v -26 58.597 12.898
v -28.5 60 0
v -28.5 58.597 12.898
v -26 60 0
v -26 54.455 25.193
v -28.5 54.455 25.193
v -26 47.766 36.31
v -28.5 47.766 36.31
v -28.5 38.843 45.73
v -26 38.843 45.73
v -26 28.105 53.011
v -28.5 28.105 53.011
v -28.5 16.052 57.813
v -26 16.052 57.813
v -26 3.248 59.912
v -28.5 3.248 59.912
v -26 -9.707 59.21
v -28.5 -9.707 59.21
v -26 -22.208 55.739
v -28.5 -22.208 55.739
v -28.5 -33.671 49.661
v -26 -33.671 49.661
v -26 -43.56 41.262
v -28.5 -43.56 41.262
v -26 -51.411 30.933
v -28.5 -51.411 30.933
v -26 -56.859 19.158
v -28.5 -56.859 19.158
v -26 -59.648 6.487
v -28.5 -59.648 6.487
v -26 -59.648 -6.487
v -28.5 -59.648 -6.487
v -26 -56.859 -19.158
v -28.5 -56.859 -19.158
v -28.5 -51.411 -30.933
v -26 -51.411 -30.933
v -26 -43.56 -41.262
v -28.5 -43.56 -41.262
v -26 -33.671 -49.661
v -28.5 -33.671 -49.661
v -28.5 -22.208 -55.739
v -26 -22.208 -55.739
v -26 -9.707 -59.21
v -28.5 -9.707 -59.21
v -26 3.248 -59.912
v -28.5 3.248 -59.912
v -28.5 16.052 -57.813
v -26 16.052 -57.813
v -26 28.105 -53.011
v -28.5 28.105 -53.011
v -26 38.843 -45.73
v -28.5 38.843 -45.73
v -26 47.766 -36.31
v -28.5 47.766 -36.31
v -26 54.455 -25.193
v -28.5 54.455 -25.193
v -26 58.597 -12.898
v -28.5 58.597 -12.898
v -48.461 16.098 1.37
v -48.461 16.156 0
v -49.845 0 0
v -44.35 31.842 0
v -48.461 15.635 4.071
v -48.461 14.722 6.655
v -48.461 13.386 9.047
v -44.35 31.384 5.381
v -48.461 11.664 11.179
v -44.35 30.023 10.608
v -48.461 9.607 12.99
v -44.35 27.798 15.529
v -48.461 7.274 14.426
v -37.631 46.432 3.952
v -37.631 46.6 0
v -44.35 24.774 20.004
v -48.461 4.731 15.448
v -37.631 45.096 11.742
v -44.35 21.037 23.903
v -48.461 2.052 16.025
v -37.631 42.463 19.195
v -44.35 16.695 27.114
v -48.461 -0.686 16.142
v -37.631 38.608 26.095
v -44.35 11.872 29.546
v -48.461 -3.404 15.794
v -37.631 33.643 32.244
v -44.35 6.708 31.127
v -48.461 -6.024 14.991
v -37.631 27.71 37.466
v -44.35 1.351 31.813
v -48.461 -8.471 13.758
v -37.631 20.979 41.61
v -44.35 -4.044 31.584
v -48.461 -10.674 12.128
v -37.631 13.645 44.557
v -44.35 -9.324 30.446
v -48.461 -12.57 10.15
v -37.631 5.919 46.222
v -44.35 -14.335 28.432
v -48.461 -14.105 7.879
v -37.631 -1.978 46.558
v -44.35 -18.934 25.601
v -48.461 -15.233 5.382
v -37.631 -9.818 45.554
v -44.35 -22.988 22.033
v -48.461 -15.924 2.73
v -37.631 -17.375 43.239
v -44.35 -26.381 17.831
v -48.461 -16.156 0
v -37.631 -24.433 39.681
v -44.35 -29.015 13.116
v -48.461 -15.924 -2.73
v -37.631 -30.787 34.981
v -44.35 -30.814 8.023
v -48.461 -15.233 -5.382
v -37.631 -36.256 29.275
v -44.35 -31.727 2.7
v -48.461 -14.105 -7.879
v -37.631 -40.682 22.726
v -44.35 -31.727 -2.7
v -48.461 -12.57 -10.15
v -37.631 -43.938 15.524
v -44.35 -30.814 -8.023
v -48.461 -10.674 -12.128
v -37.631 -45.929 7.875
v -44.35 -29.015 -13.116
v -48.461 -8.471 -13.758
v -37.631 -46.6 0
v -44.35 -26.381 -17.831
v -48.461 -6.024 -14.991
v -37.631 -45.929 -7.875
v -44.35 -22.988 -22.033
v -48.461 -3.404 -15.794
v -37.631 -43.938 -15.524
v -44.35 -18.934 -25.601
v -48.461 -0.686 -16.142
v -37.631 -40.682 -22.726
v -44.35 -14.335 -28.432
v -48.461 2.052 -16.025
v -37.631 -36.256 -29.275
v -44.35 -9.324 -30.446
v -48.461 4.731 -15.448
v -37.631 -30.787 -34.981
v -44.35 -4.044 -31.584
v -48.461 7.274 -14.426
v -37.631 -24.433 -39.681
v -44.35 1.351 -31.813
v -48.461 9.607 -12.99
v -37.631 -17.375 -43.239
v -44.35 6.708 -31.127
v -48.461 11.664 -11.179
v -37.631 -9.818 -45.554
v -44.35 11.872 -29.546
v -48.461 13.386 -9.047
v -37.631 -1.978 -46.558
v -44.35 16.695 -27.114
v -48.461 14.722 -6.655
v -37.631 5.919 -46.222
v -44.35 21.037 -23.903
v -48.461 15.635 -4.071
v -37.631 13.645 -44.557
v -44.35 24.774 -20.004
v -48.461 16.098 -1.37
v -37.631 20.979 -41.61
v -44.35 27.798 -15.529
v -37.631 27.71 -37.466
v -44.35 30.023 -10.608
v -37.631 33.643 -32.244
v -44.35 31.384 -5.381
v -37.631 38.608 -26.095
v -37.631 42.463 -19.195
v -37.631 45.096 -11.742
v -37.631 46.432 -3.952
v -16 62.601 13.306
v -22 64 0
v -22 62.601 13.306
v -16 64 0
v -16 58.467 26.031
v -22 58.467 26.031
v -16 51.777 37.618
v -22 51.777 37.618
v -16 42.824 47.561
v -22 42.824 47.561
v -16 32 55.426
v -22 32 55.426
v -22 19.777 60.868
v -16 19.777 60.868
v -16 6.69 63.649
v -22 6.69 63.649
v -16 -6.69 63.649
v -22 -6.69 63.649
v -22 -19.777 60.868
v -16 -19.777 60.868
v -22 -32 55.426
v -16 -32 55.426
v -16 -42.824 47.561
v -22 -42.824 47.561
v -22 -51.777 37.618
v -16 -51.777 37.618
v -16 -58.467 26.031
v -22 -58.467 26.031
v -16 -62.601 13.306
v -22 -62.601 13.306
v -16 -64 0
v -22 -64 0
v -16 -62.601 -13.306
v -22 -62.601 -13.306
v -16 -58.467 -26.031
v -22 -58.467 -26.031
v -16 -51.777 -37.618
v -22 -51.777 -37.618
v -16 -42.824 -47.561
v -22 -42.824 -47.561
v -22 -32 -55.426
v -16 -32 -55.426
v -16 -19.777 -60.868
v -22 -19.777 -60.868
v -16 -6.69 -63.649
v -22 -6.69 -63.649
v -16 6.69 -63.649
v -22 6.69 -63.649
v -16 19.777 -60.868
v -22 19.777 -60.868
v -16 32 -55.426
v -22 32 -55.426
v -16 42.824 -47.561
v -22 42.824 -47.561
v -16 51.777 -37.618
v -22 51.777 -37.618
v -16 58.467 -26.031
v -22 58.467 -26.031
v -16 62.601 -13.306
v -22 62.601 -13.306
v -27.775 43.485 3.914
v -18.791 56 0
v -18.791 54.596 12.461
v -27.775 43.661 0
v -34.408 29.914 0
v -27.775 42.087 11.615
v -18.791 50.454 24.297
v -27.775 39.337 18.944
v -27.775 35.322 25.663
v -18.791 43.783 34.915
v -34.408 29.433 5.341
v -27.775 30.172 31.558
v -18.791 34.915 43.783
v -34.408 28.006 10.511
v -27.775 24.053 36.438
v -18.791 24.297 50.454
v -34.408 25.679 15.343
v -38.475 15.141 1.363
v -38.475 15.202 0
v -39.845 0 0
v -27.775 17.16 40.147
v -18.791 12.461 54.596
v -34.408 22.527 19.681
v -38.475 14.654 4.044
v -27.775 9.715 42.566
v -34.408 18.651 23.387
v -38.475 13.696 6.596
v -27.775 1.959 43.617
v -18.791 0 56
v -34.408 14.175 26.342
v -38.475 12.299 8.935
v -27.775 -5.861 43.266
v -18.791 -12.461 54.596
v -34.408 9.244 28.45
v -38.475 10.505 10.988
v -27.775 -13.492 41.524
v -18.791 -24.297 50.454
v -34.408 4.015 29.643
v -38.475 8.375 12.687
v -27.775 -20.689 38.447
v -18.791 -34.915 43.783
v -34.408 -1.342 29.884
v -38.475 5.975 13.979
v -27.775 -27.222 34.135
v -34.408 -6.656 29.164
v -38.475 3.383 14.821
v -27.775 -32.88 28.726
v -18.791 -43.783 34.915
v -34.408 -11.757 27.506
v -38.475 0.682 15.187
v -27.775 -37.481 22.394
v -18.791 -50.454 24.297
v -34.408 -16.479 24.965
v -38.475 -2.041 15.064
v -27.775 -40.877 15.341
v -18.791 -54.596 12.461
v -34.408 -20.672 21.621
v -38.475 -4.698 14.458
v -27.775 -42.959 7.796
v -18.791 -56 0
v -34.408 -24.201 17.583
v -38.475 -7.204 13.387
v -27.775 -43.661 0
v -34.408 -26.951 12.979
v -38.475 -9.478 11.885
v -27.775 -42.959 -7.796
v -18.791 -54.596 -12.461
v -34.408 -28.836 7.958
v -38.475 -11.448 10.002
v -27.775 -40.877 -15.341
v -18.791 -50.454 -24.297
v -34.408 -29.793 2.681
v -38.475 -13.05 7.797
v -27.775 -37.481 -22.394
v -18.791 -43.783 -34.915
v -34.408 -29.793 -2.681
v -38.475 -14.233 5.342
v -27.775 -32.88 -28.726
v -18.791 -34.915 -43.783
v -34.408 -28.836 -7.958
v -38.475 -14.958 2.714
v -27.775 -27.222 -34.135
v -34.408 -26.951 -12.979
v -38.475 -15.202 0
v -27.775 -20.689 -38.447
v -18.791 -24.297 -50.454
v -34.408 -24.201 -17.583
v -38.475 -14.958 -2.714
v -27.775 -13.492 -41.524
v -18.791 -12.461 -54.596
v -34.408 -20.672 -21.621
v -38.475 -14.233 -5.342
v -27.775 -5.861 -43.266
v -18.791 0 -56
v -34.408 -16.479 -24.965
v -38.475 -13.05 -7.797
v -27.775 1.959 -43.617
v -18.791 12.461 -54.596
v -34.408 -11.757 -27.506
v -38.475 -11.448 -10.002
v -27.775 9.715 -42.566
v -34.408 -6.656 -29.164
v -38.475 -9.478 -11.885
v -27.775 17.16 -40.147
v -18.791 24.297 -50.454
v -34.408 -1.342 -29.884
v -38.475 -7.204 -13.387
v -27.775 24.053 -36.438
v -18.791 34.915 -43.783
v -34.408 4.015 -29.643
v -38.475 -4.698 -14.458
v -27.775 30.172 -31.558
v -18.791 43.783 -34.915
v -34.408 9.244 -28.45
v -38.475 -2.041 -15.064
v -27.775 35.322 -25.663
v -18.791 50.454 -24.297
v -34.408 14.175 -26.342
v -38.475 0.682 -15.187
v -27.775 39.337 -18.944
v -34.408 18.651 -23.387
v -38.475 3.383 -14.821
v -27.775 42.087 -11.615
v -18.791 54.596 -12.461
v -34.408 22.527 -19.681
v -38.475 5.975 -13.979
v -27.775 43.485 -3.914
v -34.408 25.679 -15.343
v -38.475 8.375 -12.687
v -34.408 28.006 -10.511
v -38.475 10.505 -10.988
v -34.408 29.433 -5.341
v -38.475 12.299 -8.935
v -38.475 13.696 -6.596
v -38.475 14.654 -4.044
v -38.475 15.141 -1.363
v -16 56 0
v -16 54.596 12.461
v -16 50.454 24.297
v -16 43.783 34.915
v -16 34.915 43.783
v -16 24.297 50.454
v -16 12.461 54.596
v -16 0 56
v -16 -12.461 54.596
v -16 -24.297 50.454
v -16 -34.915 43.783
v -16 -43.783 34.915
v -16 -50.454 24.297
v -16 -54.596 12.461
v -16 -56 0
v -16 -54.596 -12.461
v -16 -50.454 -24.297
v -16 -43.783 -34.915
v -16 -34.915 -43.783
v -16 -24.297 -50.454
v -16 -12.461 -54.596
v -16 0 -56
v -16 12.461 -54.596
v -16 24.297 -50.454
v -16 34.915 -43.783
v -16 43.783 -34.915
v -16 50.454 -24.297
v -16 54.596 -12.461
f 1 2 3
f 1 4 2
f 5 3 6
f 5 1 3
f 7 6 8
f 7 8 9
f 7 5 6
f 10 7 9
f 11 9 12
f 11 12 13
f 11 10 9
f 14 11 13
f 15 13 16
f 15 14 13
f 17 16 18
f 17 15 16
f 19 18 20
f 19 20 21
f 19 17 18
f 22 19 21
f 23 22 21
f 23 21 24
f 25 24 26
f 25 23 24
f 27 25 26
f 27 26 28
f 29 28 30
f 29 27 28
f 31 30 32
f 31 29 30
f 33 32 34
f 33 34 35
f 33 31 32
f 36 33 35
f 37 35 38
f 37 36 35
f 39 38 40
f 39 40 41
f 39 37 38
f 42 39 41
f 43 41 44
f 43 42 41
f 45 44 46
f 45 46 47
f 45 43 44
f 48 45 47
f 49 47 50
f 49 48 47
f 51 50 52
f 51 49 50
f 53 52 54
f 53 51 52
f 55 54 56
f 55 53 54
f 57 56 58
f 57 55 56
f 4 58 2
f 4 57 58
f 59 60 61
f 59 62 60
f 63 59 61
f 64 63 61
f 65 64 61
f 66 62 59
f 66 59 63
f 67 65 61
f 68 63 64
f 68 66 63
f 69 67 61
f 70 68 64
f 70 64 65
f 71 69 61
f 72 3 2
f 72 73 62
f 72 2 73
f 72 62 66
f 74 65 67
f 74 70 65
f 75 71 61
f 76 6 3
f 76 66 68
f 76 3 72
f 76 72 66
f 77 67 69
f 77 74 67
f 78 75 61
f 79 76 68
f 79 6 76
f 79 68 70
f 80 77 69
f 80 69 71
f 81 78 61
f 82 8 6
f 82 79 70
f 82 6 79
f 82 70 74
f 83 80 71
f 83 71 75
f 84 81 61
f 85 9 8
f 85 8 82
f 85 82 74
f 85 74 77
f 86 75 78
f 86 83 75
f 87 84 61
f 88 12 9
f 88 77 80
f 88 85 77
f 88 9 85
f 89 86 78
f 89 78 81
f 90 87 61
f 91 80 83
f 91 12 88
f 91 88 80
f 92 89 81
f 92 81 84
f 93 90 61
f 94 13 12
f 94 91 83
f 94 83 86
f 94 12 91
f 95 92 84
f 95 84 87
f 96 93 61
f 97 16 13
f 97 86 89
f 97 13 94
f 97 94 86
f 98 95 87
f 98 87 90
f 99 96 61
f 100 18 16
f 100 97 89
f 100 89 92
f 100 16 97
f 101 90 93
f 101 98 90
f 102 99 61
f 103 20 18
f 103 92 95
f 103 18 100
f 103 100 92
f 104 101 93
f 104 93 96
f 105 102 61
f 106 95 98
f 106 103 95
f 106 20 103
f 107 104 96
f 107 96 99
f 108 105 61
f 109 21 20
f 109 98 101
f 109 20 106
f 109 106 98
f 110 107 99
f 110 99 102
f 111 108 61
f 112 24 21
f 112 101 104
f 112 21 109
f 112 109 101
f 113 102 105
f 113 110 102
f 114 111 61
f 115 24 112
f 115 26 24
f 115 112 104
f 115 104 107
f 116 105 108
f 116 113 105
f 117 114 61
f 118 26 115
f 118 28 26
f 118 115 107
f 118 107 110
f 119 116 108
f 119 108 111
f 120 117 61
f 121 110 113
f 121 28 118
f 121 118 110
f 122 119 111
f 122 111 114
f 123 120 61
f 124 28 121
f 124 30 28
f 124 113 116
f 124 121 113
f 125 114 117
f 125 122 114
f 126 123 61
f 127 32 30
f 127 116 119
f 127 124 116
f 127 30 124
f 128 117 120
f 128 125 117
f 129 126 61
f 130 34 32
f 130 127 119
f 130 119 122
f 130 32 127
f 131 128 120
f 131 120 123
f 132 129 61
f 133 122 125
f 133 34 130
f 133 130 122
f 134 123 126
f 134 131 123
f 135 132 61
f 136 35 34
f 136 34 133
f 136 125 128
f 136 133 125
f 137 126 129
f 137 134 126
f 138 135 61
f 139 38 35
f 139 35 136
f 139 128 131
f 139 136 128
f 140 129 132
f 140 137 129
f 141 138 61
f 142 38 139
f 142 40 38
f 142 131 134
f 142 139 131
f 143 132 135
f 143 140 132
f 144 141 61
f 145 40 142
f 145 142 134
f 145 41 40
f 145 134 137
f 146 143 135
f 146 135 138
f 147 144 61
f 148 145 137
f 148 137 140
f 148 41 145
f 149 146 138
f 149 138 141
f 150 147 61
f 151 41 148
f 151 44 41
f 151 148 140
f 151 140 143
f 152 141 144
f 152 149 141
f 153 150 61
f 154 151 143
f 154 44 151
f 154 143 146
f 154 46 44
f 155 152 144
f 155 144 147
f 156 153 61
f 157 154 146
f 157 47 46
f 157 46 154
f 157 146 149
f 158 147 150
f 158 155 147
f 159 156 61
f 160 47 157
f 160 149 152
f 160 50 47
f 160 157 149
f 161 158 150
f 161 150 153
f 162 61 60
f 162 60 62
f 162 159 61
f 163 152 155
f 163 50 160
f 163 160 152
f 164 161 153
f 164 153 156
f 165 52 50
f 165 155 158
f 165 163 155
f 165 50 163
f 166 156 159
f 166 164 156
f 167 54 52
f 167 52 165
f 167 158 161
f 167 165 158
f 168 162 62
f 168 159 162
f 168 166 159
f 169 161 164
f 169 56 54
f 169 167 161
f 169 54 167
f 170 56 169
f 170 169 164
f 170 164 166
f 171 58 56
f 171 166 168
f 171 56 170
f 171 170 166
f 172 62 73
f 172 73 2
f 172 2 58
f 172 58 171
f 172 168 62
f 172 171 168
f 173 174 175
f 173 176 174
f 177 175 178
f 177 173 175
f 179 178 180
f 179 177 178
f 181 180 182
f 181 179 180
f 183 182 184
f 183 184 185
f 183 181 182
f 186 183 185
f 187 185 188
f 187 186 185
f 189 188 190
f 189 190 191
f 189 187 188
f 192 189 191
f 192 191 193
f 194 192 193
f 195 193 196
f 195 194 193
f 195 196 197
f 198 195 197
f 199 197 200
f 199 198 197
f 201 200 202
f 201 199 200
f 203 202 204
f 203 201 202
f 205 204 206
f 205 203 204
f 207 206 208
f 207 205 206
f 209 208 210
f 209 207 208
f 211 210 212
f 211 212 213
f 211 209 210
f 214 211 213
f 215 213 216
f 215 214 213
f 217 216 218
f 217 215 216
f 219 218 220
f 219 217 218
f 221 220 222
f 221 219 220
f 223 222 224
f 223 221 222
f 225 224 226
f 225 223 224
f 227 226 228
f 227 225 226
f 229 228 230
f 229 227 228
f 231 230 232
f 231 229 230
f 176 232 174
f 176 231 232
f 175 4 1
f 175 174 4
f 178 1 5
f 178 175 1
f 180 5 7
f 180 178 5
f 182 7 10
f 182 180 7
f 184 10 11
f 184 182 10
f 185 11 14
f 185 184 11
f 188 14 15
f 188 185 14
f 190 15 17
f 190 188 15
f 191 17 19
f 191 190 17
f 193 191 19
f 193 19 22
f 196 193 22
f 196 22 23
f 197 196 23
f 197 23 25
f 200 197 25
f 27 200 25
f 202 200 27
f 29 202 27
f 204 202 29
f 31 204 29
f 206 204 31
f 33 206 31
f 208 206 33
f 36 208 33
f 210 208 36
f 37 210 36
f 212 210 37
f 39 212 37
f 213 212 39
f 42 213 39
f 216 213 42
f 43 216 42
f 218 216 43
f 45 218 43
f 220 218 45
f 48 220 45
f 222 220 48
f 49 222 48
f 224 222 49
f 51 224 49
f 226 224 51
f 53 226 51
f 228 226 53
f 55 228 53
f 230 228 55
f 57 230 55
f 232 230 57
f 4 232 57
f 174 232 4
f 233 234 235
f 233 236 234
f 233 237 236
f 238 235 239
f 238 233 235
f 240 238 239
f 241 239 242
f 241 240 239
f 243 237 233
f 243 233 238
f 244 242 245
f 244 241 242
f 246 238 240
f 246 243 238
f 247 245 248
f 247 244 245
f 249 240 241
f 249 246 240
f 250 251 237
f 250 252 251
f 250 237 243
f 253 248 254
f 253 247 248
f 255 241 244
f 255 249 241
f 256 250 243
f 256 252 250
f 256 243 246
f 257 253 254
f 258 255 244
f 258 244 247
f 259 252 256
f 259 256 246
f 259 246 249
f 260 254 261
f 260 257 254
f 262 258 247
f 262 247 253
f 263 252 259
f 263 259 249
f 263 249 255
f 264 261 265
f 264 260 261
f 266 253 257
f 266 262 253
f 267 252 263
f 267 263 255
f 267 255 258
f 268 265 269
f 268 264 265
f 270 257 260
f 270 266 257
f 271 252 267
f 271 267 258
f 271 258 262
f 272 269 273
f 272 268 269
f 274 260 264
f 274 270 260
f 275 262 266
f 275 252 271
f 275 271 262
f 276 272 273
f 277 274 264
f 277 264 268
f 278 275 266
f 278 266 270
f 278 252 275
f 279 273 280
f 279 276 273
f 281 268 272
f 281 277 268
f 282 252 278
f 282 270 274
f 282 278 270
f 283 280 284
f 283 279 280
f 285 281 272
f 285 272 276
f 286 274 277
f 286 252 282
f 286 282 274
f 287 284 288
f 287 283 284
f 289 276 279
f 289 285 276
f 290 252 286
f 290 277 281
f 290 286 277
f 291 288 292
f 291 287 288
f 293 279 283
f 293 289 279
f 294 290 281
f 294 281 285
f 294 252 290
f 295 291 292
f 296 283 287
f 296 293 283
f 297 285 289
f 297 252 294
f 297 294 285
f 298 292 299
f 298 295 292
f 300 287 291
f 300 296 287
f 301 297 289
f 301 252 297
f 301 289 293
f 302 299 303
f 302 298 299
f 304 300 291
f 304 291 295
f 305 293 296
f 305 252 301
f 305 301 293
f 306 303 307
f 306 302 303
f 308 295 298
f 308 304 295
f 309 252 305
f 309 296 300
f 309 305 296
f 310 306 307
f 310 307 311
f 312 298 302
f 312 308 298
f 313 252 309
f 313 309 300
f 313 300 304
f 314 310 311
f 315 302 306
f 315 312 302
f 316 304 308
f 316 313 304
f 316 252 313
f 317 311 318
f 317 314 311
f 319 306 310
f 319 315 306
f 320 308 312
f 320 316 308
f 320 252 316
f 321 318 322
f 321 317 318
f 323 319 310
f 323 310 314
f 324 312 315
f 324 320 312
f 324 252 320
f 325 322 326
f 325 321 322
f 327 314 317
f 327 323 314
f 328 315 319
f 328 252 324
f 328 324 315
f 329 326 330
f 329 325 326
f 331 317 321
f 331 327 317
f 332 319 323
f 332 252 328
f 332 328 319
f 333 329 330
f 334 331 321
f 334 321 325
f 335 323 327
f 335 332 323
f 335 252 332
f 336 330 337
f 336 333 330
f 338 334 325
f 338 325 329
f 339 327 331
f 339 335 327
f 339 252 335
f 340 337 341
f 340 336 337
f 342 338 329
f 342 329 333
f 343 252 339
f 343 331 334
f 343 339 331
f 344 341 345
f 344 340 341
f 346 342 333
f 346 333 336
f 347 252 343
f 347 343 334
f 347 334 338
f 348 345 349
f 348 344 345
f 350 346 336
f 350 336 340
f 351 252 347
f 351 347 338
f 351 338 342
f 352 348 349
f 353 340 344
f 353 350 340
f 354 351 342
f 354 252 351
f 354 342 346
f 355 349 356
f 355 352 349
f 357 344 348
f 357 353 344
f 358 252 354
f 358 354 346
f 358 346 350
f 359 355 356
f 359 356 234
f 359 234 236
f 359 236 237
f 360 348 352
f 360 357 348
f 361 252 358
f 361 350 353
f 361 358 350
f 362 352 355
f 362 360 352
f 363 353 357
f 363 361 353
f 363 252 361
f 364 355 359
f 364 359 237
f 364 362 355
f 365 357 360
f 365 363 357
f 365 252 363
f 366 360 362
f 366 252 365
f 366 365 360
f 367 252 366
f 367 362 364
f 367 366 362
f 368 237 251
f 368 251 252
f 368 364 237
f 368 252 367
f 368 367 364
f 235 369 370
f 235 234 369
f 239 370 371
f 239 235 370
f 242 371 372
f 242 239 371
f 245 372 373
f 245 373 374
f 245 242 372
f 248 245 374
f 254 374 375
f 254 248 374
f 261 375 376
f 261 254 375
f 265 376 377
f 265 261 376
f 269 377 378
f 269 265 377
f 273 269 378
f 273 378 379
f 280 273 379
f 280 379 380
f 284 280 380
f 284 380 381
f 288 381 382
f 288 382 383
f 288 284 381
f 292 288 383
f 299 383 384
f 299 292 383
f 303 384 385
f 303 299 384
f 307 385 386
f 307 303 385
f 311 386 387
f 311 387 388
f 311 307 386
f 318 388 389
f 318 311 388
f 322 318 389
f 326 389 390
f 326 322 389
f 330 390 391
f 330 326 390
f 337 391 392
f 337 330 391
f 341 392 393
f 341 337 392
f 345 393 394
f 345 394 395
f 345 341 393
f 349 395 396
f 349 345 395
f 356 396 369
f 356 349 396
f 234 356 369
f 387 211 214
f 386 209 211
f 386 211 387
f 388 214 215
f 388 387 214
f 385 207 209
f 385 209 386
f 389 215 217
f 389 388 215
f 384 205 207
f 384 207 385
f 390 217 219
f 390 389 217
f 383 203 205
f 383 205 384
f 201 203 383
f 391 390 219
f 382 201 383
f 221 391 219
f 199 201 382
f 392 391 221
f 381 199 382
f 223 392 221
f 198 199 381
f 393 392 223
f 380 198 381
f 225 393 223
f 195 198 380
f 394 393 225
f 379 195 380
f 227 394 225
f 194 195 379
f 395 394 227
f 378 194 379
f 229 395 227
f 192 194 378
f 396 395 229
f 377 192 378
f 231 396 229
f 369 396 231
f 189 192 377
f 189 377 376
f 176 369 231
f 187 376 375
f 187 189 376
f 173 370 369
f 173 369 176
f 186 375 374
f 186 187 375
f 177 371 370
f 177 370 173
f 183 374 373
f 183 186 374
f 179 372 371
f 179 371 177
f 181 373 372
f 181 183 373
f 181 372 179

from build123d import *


with BuildPart() as part:
    # Sketch1 → Revolve1 (revolve)
    with BuildSketch(Plane.XY):
        with BuildLine():
            Line((-28.5, 60), (-26, 60))
            Line((-26, 60), (-22, 64))
            Line((-22, 64), (-16, 64))
            Line((-16, 64), (-16, 56))
            Line((-16, 56), (-18.790689802, 56))
            ThreePointArc((-18.790689802, 56), (-34.407796248, 29.913629212), (-39.845400687, 0))
            Line((-39.845400687, 0), (-49.845400687, 0))
            ThreePointArc((-49.845400687, 0), (-44.350112671, 31.841899011), (-28.5, 60))
        make_face()
    revolve(axis=Axis((-162.413763562, 0, 0), (1, 0, 0)))


solid = part.part
